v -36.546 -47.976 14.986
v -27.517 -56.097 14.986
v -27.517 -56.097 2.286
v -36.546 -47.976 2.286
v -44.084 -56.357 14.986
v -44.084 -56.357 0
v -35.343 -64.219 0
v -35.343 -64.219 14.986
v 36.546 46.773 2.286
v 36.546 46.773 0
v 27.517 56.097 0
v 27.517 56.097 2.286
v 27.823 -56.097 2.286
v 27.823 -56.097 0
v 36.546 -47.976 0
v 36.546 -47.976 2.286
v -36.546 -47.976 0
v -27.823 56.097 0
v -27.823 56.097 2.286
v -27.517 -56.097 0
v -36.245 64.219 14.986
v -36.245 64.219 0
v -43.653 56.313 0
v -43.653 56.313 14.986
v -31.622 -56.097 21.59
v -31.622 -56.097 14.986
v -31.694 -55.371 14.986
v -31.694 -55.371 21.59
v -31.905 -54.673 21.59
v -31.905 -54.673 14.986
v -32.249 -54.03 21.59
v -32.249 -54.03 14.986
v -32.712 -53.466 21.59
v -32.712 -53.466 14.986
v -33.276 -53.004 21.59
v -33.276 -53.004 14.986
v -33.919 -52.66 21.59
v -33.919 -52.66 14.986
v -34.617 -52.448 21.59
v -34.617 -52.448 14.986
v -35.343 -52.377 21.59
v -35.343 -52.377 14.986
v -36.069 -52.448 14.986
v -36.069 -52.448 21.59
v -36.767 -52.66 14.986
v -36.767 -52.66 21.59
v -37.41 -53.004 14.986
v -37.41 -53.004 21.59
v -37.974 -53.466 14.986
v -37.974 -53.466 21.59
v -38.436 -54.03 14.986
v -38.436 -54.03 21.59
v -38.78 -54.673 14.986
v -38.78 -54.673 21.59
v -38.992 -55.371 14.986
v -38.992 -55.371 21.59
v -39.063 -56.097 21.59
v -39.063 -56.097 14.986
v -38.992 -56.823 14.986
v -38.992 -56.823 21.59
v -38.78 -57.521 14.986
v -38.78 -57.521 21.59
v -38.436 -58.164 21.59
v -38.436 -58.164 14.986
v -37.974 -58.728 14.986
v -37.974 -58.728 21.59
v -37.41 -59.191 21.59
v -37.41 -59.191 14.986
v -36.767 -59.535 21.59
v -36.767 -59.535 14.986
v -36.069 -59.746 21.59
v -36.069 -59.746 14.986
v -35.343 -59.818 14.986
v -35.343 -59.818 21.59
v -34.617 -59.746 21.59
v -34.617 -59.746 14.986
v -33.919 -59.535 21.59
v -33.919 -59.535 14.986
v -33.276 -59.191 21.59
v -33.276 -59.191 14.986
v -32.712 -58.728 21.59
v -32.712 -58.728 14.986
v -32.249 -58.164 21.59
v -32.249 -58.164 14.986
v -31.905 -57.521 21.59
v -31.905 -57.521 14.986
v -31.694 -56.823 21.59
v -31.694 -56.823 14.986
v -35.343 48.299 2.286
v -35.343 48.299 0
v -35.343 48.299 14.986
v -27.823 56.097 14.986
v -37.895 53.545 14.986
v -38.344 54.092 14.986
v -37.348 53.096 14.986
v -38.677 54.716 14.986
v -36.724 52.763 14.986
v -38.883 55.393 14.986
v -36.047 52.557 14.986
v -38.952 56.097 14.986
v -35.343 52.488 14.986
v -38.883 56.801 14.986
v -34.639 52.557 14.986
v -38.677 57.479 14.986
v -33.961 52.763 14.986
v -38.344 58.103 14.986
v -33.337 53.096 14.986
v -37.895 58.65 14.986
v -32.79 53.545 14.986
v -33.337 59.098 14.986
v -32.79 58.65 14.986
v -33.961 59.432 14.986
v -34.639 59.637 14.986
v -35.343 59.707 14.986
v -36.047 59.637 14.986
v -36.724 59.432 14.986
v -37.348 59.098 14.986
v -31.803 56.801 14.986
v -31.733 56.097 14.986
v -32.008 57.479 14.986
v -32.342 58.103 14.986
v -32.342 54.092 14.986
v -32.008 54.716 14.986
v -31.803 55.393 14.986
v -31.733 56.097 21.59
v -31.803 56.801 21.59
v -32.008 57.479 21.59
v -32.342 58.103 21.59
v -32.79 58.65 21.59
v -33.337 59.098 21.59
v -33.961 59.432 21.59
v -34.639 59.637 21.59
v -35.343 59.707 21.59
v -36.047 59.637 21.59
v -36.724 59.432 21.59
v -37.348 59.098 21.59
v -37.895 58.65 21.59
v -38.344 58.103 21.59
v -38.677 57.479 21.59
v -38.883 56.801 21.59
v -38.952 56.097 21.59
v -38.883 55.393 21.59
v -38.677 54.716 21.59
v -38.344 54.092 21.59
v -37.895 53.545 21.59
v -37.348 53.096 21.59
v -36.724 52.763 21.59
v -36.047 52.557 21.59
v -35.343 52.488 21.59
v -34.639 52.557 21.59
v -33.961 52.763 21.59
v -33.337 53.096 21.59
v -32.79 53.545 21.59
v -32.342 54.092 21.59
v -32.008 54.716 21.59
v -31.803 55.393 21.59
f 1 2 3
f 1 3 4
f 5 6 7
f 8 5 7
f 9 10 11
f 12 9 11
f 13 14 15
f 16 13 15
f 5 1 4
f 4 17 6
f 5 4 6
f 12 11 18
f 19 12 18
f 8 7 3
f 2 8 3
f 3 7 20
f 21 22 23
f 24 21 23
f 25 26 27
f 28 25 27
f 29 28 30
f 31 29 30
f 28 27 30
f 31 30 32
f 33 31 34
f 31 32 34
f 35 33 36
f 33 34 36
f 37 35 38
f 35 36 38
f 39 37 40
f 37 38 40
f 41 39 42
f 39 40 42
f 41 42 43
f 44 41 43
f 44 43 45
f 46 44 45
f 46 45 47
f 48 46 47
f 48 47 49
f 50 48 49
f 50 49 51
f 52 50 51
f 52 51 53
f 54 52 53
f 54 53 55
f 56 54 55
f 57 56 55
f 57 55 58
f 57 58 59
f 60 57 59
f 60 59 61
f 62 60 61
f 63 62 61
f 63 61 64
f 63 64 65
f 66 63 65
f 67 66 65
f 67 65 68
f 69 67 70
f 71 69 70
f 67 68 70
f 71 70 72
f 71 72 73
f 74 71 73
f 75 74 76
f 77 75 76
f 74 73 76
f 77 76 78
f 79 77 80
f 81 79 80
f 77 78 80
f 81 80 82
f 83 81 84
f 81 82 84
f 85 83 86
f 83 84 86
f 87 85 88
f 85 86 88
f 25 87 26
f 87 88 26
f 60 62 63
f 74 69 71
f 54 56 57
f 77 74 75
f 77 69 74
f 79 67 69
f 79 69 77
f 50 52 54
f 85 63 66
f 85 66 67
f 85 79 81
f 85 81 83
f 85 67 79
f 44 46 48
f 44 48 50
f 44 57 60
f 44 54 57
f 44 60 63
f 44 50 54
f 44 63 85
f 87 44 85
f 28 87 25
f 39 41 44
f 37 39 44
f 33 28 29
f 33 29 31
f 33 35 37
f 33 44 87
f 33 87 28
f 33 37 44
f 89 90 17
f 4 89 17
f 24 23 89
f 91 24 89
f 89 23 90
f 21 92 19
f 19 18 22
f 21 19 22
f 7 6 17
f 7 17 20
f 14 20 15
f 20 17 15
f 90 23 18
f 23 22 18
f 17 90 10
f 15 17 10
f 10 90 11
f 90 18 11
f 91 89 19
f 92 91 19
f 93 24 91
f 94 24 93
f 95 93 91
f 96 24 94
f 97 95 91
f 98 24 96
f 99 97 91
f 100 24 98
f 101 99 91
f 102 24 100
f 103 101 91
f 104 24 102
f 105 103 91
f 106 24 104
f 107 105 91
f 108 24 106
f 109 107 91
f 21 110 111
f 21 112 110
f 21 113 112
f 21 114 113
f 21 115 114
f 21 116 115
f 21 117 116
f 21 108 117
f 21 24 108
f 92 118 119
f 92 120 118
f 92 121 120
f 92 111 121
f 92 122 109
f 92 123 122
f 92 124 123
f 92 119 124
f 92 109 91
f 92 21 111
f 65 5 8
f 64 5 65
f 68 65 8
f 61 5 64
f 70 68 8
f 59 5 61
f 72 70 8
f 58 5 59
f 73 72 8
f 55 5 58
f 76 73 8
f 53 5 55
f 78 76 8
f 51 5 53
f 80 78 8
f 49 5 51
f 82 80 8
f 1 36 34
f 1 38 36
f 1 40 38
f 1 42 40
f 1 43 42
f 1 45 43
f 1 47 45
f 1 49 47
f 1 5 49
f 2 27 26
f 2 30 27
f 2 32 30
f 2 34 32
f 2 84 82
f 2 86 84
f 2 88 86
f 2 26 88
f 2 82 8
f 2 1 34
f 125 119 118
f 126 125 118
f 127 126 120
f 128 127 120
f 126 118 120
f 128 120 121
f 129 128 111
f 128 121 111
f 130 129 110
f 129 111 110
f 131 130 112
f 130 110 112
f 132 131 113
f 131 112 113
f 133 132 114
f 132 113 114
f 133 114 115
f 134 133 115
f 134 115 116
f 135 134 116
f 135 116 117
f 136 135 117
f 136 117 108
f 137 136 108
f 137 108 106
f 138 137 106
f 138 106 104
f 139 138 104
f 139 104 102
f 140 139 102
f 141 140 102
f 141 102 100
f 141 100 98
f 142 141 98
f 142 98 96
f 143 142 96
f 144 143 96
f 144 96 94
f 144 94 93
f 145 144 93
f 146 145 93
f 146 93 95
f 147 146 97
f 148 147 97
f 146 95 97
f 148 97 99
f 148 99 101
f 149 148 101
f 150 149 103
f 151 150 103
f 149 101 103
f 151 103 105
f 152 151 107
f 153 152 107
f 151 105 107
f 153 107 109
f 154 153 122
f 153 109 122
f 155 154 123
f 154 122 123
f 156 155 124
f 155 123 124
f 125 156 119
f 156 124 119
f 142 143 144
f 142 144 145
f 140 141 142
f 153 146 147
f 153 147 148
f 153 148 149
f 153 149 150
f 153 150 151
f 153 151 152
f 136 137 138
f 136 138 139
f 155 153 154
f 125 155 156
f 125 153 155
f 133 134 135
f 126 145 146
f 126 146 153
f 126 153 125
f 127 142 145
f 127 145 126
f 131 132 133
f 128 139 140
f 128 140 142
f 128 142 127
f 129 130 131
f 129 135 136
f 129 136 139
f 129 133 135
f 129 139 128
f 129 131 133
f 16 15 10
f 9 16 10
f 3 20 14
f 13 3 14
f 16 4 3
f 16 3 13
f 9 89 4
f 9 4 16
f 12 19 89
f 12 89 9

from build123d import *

# Parameters (mm, degrees)
F1_DEPTH = 2.286
F0_R     = 3.609475
F0_R_2   = 3.720562
F2_DEPTH = 14.986
F3_DEPTH = 21.59


with BuildPart() as f1:
    # F0 (on Top) → F1 (new body)
    with BuildSketch(Plane.XY):
        Polygon((36.545925, 46.772763), (27.516532, 56.097239), (-27.823025, 56.097239), (-35.342764, 48.298985), (-36.545925, -47.97592), (-27.516532, -56.097239), (27.823025, -56.097239), (36.545925, -47.97592), align=None)
    extrude(amount=F1_DEPTH)

    # F0 (on Top) → F2 (join)
    with BuildSketch(Plane.XY):
        Polygon((-35.342764, 48.298985), (-27.823025, 56.097239), (-36.245134, 64.218551), (-43.653179, 56.312592), align=None)
        with Locations((-35.342764, 56.097239)):
            Circle(F0_R, mode=Mode.SUBTRACT)
        Polygon((-27.516532, -56.097239), (-36.545925, -47.97592), (-44.083779, -56.356608), (-35.342764, -64.218551), align=None)
        with Locations((-35.342764, -56.097239)):
            Circle(F0_R_2, mode=Mode.SUBTRACT)
    extrude(amount=F2_DEPTH)

    # F0 (on Top) → F3 (join)
    with BuildSketch(Plane.XY):
        with Locations((-35.342764, 56.097239)):
            Circle(F0_R)
        with Locations((-35.342764, -56.097239)):
            Circle(F0_R_2)
    extrude(amount=F3_DEPTH)


solid = f1.part
